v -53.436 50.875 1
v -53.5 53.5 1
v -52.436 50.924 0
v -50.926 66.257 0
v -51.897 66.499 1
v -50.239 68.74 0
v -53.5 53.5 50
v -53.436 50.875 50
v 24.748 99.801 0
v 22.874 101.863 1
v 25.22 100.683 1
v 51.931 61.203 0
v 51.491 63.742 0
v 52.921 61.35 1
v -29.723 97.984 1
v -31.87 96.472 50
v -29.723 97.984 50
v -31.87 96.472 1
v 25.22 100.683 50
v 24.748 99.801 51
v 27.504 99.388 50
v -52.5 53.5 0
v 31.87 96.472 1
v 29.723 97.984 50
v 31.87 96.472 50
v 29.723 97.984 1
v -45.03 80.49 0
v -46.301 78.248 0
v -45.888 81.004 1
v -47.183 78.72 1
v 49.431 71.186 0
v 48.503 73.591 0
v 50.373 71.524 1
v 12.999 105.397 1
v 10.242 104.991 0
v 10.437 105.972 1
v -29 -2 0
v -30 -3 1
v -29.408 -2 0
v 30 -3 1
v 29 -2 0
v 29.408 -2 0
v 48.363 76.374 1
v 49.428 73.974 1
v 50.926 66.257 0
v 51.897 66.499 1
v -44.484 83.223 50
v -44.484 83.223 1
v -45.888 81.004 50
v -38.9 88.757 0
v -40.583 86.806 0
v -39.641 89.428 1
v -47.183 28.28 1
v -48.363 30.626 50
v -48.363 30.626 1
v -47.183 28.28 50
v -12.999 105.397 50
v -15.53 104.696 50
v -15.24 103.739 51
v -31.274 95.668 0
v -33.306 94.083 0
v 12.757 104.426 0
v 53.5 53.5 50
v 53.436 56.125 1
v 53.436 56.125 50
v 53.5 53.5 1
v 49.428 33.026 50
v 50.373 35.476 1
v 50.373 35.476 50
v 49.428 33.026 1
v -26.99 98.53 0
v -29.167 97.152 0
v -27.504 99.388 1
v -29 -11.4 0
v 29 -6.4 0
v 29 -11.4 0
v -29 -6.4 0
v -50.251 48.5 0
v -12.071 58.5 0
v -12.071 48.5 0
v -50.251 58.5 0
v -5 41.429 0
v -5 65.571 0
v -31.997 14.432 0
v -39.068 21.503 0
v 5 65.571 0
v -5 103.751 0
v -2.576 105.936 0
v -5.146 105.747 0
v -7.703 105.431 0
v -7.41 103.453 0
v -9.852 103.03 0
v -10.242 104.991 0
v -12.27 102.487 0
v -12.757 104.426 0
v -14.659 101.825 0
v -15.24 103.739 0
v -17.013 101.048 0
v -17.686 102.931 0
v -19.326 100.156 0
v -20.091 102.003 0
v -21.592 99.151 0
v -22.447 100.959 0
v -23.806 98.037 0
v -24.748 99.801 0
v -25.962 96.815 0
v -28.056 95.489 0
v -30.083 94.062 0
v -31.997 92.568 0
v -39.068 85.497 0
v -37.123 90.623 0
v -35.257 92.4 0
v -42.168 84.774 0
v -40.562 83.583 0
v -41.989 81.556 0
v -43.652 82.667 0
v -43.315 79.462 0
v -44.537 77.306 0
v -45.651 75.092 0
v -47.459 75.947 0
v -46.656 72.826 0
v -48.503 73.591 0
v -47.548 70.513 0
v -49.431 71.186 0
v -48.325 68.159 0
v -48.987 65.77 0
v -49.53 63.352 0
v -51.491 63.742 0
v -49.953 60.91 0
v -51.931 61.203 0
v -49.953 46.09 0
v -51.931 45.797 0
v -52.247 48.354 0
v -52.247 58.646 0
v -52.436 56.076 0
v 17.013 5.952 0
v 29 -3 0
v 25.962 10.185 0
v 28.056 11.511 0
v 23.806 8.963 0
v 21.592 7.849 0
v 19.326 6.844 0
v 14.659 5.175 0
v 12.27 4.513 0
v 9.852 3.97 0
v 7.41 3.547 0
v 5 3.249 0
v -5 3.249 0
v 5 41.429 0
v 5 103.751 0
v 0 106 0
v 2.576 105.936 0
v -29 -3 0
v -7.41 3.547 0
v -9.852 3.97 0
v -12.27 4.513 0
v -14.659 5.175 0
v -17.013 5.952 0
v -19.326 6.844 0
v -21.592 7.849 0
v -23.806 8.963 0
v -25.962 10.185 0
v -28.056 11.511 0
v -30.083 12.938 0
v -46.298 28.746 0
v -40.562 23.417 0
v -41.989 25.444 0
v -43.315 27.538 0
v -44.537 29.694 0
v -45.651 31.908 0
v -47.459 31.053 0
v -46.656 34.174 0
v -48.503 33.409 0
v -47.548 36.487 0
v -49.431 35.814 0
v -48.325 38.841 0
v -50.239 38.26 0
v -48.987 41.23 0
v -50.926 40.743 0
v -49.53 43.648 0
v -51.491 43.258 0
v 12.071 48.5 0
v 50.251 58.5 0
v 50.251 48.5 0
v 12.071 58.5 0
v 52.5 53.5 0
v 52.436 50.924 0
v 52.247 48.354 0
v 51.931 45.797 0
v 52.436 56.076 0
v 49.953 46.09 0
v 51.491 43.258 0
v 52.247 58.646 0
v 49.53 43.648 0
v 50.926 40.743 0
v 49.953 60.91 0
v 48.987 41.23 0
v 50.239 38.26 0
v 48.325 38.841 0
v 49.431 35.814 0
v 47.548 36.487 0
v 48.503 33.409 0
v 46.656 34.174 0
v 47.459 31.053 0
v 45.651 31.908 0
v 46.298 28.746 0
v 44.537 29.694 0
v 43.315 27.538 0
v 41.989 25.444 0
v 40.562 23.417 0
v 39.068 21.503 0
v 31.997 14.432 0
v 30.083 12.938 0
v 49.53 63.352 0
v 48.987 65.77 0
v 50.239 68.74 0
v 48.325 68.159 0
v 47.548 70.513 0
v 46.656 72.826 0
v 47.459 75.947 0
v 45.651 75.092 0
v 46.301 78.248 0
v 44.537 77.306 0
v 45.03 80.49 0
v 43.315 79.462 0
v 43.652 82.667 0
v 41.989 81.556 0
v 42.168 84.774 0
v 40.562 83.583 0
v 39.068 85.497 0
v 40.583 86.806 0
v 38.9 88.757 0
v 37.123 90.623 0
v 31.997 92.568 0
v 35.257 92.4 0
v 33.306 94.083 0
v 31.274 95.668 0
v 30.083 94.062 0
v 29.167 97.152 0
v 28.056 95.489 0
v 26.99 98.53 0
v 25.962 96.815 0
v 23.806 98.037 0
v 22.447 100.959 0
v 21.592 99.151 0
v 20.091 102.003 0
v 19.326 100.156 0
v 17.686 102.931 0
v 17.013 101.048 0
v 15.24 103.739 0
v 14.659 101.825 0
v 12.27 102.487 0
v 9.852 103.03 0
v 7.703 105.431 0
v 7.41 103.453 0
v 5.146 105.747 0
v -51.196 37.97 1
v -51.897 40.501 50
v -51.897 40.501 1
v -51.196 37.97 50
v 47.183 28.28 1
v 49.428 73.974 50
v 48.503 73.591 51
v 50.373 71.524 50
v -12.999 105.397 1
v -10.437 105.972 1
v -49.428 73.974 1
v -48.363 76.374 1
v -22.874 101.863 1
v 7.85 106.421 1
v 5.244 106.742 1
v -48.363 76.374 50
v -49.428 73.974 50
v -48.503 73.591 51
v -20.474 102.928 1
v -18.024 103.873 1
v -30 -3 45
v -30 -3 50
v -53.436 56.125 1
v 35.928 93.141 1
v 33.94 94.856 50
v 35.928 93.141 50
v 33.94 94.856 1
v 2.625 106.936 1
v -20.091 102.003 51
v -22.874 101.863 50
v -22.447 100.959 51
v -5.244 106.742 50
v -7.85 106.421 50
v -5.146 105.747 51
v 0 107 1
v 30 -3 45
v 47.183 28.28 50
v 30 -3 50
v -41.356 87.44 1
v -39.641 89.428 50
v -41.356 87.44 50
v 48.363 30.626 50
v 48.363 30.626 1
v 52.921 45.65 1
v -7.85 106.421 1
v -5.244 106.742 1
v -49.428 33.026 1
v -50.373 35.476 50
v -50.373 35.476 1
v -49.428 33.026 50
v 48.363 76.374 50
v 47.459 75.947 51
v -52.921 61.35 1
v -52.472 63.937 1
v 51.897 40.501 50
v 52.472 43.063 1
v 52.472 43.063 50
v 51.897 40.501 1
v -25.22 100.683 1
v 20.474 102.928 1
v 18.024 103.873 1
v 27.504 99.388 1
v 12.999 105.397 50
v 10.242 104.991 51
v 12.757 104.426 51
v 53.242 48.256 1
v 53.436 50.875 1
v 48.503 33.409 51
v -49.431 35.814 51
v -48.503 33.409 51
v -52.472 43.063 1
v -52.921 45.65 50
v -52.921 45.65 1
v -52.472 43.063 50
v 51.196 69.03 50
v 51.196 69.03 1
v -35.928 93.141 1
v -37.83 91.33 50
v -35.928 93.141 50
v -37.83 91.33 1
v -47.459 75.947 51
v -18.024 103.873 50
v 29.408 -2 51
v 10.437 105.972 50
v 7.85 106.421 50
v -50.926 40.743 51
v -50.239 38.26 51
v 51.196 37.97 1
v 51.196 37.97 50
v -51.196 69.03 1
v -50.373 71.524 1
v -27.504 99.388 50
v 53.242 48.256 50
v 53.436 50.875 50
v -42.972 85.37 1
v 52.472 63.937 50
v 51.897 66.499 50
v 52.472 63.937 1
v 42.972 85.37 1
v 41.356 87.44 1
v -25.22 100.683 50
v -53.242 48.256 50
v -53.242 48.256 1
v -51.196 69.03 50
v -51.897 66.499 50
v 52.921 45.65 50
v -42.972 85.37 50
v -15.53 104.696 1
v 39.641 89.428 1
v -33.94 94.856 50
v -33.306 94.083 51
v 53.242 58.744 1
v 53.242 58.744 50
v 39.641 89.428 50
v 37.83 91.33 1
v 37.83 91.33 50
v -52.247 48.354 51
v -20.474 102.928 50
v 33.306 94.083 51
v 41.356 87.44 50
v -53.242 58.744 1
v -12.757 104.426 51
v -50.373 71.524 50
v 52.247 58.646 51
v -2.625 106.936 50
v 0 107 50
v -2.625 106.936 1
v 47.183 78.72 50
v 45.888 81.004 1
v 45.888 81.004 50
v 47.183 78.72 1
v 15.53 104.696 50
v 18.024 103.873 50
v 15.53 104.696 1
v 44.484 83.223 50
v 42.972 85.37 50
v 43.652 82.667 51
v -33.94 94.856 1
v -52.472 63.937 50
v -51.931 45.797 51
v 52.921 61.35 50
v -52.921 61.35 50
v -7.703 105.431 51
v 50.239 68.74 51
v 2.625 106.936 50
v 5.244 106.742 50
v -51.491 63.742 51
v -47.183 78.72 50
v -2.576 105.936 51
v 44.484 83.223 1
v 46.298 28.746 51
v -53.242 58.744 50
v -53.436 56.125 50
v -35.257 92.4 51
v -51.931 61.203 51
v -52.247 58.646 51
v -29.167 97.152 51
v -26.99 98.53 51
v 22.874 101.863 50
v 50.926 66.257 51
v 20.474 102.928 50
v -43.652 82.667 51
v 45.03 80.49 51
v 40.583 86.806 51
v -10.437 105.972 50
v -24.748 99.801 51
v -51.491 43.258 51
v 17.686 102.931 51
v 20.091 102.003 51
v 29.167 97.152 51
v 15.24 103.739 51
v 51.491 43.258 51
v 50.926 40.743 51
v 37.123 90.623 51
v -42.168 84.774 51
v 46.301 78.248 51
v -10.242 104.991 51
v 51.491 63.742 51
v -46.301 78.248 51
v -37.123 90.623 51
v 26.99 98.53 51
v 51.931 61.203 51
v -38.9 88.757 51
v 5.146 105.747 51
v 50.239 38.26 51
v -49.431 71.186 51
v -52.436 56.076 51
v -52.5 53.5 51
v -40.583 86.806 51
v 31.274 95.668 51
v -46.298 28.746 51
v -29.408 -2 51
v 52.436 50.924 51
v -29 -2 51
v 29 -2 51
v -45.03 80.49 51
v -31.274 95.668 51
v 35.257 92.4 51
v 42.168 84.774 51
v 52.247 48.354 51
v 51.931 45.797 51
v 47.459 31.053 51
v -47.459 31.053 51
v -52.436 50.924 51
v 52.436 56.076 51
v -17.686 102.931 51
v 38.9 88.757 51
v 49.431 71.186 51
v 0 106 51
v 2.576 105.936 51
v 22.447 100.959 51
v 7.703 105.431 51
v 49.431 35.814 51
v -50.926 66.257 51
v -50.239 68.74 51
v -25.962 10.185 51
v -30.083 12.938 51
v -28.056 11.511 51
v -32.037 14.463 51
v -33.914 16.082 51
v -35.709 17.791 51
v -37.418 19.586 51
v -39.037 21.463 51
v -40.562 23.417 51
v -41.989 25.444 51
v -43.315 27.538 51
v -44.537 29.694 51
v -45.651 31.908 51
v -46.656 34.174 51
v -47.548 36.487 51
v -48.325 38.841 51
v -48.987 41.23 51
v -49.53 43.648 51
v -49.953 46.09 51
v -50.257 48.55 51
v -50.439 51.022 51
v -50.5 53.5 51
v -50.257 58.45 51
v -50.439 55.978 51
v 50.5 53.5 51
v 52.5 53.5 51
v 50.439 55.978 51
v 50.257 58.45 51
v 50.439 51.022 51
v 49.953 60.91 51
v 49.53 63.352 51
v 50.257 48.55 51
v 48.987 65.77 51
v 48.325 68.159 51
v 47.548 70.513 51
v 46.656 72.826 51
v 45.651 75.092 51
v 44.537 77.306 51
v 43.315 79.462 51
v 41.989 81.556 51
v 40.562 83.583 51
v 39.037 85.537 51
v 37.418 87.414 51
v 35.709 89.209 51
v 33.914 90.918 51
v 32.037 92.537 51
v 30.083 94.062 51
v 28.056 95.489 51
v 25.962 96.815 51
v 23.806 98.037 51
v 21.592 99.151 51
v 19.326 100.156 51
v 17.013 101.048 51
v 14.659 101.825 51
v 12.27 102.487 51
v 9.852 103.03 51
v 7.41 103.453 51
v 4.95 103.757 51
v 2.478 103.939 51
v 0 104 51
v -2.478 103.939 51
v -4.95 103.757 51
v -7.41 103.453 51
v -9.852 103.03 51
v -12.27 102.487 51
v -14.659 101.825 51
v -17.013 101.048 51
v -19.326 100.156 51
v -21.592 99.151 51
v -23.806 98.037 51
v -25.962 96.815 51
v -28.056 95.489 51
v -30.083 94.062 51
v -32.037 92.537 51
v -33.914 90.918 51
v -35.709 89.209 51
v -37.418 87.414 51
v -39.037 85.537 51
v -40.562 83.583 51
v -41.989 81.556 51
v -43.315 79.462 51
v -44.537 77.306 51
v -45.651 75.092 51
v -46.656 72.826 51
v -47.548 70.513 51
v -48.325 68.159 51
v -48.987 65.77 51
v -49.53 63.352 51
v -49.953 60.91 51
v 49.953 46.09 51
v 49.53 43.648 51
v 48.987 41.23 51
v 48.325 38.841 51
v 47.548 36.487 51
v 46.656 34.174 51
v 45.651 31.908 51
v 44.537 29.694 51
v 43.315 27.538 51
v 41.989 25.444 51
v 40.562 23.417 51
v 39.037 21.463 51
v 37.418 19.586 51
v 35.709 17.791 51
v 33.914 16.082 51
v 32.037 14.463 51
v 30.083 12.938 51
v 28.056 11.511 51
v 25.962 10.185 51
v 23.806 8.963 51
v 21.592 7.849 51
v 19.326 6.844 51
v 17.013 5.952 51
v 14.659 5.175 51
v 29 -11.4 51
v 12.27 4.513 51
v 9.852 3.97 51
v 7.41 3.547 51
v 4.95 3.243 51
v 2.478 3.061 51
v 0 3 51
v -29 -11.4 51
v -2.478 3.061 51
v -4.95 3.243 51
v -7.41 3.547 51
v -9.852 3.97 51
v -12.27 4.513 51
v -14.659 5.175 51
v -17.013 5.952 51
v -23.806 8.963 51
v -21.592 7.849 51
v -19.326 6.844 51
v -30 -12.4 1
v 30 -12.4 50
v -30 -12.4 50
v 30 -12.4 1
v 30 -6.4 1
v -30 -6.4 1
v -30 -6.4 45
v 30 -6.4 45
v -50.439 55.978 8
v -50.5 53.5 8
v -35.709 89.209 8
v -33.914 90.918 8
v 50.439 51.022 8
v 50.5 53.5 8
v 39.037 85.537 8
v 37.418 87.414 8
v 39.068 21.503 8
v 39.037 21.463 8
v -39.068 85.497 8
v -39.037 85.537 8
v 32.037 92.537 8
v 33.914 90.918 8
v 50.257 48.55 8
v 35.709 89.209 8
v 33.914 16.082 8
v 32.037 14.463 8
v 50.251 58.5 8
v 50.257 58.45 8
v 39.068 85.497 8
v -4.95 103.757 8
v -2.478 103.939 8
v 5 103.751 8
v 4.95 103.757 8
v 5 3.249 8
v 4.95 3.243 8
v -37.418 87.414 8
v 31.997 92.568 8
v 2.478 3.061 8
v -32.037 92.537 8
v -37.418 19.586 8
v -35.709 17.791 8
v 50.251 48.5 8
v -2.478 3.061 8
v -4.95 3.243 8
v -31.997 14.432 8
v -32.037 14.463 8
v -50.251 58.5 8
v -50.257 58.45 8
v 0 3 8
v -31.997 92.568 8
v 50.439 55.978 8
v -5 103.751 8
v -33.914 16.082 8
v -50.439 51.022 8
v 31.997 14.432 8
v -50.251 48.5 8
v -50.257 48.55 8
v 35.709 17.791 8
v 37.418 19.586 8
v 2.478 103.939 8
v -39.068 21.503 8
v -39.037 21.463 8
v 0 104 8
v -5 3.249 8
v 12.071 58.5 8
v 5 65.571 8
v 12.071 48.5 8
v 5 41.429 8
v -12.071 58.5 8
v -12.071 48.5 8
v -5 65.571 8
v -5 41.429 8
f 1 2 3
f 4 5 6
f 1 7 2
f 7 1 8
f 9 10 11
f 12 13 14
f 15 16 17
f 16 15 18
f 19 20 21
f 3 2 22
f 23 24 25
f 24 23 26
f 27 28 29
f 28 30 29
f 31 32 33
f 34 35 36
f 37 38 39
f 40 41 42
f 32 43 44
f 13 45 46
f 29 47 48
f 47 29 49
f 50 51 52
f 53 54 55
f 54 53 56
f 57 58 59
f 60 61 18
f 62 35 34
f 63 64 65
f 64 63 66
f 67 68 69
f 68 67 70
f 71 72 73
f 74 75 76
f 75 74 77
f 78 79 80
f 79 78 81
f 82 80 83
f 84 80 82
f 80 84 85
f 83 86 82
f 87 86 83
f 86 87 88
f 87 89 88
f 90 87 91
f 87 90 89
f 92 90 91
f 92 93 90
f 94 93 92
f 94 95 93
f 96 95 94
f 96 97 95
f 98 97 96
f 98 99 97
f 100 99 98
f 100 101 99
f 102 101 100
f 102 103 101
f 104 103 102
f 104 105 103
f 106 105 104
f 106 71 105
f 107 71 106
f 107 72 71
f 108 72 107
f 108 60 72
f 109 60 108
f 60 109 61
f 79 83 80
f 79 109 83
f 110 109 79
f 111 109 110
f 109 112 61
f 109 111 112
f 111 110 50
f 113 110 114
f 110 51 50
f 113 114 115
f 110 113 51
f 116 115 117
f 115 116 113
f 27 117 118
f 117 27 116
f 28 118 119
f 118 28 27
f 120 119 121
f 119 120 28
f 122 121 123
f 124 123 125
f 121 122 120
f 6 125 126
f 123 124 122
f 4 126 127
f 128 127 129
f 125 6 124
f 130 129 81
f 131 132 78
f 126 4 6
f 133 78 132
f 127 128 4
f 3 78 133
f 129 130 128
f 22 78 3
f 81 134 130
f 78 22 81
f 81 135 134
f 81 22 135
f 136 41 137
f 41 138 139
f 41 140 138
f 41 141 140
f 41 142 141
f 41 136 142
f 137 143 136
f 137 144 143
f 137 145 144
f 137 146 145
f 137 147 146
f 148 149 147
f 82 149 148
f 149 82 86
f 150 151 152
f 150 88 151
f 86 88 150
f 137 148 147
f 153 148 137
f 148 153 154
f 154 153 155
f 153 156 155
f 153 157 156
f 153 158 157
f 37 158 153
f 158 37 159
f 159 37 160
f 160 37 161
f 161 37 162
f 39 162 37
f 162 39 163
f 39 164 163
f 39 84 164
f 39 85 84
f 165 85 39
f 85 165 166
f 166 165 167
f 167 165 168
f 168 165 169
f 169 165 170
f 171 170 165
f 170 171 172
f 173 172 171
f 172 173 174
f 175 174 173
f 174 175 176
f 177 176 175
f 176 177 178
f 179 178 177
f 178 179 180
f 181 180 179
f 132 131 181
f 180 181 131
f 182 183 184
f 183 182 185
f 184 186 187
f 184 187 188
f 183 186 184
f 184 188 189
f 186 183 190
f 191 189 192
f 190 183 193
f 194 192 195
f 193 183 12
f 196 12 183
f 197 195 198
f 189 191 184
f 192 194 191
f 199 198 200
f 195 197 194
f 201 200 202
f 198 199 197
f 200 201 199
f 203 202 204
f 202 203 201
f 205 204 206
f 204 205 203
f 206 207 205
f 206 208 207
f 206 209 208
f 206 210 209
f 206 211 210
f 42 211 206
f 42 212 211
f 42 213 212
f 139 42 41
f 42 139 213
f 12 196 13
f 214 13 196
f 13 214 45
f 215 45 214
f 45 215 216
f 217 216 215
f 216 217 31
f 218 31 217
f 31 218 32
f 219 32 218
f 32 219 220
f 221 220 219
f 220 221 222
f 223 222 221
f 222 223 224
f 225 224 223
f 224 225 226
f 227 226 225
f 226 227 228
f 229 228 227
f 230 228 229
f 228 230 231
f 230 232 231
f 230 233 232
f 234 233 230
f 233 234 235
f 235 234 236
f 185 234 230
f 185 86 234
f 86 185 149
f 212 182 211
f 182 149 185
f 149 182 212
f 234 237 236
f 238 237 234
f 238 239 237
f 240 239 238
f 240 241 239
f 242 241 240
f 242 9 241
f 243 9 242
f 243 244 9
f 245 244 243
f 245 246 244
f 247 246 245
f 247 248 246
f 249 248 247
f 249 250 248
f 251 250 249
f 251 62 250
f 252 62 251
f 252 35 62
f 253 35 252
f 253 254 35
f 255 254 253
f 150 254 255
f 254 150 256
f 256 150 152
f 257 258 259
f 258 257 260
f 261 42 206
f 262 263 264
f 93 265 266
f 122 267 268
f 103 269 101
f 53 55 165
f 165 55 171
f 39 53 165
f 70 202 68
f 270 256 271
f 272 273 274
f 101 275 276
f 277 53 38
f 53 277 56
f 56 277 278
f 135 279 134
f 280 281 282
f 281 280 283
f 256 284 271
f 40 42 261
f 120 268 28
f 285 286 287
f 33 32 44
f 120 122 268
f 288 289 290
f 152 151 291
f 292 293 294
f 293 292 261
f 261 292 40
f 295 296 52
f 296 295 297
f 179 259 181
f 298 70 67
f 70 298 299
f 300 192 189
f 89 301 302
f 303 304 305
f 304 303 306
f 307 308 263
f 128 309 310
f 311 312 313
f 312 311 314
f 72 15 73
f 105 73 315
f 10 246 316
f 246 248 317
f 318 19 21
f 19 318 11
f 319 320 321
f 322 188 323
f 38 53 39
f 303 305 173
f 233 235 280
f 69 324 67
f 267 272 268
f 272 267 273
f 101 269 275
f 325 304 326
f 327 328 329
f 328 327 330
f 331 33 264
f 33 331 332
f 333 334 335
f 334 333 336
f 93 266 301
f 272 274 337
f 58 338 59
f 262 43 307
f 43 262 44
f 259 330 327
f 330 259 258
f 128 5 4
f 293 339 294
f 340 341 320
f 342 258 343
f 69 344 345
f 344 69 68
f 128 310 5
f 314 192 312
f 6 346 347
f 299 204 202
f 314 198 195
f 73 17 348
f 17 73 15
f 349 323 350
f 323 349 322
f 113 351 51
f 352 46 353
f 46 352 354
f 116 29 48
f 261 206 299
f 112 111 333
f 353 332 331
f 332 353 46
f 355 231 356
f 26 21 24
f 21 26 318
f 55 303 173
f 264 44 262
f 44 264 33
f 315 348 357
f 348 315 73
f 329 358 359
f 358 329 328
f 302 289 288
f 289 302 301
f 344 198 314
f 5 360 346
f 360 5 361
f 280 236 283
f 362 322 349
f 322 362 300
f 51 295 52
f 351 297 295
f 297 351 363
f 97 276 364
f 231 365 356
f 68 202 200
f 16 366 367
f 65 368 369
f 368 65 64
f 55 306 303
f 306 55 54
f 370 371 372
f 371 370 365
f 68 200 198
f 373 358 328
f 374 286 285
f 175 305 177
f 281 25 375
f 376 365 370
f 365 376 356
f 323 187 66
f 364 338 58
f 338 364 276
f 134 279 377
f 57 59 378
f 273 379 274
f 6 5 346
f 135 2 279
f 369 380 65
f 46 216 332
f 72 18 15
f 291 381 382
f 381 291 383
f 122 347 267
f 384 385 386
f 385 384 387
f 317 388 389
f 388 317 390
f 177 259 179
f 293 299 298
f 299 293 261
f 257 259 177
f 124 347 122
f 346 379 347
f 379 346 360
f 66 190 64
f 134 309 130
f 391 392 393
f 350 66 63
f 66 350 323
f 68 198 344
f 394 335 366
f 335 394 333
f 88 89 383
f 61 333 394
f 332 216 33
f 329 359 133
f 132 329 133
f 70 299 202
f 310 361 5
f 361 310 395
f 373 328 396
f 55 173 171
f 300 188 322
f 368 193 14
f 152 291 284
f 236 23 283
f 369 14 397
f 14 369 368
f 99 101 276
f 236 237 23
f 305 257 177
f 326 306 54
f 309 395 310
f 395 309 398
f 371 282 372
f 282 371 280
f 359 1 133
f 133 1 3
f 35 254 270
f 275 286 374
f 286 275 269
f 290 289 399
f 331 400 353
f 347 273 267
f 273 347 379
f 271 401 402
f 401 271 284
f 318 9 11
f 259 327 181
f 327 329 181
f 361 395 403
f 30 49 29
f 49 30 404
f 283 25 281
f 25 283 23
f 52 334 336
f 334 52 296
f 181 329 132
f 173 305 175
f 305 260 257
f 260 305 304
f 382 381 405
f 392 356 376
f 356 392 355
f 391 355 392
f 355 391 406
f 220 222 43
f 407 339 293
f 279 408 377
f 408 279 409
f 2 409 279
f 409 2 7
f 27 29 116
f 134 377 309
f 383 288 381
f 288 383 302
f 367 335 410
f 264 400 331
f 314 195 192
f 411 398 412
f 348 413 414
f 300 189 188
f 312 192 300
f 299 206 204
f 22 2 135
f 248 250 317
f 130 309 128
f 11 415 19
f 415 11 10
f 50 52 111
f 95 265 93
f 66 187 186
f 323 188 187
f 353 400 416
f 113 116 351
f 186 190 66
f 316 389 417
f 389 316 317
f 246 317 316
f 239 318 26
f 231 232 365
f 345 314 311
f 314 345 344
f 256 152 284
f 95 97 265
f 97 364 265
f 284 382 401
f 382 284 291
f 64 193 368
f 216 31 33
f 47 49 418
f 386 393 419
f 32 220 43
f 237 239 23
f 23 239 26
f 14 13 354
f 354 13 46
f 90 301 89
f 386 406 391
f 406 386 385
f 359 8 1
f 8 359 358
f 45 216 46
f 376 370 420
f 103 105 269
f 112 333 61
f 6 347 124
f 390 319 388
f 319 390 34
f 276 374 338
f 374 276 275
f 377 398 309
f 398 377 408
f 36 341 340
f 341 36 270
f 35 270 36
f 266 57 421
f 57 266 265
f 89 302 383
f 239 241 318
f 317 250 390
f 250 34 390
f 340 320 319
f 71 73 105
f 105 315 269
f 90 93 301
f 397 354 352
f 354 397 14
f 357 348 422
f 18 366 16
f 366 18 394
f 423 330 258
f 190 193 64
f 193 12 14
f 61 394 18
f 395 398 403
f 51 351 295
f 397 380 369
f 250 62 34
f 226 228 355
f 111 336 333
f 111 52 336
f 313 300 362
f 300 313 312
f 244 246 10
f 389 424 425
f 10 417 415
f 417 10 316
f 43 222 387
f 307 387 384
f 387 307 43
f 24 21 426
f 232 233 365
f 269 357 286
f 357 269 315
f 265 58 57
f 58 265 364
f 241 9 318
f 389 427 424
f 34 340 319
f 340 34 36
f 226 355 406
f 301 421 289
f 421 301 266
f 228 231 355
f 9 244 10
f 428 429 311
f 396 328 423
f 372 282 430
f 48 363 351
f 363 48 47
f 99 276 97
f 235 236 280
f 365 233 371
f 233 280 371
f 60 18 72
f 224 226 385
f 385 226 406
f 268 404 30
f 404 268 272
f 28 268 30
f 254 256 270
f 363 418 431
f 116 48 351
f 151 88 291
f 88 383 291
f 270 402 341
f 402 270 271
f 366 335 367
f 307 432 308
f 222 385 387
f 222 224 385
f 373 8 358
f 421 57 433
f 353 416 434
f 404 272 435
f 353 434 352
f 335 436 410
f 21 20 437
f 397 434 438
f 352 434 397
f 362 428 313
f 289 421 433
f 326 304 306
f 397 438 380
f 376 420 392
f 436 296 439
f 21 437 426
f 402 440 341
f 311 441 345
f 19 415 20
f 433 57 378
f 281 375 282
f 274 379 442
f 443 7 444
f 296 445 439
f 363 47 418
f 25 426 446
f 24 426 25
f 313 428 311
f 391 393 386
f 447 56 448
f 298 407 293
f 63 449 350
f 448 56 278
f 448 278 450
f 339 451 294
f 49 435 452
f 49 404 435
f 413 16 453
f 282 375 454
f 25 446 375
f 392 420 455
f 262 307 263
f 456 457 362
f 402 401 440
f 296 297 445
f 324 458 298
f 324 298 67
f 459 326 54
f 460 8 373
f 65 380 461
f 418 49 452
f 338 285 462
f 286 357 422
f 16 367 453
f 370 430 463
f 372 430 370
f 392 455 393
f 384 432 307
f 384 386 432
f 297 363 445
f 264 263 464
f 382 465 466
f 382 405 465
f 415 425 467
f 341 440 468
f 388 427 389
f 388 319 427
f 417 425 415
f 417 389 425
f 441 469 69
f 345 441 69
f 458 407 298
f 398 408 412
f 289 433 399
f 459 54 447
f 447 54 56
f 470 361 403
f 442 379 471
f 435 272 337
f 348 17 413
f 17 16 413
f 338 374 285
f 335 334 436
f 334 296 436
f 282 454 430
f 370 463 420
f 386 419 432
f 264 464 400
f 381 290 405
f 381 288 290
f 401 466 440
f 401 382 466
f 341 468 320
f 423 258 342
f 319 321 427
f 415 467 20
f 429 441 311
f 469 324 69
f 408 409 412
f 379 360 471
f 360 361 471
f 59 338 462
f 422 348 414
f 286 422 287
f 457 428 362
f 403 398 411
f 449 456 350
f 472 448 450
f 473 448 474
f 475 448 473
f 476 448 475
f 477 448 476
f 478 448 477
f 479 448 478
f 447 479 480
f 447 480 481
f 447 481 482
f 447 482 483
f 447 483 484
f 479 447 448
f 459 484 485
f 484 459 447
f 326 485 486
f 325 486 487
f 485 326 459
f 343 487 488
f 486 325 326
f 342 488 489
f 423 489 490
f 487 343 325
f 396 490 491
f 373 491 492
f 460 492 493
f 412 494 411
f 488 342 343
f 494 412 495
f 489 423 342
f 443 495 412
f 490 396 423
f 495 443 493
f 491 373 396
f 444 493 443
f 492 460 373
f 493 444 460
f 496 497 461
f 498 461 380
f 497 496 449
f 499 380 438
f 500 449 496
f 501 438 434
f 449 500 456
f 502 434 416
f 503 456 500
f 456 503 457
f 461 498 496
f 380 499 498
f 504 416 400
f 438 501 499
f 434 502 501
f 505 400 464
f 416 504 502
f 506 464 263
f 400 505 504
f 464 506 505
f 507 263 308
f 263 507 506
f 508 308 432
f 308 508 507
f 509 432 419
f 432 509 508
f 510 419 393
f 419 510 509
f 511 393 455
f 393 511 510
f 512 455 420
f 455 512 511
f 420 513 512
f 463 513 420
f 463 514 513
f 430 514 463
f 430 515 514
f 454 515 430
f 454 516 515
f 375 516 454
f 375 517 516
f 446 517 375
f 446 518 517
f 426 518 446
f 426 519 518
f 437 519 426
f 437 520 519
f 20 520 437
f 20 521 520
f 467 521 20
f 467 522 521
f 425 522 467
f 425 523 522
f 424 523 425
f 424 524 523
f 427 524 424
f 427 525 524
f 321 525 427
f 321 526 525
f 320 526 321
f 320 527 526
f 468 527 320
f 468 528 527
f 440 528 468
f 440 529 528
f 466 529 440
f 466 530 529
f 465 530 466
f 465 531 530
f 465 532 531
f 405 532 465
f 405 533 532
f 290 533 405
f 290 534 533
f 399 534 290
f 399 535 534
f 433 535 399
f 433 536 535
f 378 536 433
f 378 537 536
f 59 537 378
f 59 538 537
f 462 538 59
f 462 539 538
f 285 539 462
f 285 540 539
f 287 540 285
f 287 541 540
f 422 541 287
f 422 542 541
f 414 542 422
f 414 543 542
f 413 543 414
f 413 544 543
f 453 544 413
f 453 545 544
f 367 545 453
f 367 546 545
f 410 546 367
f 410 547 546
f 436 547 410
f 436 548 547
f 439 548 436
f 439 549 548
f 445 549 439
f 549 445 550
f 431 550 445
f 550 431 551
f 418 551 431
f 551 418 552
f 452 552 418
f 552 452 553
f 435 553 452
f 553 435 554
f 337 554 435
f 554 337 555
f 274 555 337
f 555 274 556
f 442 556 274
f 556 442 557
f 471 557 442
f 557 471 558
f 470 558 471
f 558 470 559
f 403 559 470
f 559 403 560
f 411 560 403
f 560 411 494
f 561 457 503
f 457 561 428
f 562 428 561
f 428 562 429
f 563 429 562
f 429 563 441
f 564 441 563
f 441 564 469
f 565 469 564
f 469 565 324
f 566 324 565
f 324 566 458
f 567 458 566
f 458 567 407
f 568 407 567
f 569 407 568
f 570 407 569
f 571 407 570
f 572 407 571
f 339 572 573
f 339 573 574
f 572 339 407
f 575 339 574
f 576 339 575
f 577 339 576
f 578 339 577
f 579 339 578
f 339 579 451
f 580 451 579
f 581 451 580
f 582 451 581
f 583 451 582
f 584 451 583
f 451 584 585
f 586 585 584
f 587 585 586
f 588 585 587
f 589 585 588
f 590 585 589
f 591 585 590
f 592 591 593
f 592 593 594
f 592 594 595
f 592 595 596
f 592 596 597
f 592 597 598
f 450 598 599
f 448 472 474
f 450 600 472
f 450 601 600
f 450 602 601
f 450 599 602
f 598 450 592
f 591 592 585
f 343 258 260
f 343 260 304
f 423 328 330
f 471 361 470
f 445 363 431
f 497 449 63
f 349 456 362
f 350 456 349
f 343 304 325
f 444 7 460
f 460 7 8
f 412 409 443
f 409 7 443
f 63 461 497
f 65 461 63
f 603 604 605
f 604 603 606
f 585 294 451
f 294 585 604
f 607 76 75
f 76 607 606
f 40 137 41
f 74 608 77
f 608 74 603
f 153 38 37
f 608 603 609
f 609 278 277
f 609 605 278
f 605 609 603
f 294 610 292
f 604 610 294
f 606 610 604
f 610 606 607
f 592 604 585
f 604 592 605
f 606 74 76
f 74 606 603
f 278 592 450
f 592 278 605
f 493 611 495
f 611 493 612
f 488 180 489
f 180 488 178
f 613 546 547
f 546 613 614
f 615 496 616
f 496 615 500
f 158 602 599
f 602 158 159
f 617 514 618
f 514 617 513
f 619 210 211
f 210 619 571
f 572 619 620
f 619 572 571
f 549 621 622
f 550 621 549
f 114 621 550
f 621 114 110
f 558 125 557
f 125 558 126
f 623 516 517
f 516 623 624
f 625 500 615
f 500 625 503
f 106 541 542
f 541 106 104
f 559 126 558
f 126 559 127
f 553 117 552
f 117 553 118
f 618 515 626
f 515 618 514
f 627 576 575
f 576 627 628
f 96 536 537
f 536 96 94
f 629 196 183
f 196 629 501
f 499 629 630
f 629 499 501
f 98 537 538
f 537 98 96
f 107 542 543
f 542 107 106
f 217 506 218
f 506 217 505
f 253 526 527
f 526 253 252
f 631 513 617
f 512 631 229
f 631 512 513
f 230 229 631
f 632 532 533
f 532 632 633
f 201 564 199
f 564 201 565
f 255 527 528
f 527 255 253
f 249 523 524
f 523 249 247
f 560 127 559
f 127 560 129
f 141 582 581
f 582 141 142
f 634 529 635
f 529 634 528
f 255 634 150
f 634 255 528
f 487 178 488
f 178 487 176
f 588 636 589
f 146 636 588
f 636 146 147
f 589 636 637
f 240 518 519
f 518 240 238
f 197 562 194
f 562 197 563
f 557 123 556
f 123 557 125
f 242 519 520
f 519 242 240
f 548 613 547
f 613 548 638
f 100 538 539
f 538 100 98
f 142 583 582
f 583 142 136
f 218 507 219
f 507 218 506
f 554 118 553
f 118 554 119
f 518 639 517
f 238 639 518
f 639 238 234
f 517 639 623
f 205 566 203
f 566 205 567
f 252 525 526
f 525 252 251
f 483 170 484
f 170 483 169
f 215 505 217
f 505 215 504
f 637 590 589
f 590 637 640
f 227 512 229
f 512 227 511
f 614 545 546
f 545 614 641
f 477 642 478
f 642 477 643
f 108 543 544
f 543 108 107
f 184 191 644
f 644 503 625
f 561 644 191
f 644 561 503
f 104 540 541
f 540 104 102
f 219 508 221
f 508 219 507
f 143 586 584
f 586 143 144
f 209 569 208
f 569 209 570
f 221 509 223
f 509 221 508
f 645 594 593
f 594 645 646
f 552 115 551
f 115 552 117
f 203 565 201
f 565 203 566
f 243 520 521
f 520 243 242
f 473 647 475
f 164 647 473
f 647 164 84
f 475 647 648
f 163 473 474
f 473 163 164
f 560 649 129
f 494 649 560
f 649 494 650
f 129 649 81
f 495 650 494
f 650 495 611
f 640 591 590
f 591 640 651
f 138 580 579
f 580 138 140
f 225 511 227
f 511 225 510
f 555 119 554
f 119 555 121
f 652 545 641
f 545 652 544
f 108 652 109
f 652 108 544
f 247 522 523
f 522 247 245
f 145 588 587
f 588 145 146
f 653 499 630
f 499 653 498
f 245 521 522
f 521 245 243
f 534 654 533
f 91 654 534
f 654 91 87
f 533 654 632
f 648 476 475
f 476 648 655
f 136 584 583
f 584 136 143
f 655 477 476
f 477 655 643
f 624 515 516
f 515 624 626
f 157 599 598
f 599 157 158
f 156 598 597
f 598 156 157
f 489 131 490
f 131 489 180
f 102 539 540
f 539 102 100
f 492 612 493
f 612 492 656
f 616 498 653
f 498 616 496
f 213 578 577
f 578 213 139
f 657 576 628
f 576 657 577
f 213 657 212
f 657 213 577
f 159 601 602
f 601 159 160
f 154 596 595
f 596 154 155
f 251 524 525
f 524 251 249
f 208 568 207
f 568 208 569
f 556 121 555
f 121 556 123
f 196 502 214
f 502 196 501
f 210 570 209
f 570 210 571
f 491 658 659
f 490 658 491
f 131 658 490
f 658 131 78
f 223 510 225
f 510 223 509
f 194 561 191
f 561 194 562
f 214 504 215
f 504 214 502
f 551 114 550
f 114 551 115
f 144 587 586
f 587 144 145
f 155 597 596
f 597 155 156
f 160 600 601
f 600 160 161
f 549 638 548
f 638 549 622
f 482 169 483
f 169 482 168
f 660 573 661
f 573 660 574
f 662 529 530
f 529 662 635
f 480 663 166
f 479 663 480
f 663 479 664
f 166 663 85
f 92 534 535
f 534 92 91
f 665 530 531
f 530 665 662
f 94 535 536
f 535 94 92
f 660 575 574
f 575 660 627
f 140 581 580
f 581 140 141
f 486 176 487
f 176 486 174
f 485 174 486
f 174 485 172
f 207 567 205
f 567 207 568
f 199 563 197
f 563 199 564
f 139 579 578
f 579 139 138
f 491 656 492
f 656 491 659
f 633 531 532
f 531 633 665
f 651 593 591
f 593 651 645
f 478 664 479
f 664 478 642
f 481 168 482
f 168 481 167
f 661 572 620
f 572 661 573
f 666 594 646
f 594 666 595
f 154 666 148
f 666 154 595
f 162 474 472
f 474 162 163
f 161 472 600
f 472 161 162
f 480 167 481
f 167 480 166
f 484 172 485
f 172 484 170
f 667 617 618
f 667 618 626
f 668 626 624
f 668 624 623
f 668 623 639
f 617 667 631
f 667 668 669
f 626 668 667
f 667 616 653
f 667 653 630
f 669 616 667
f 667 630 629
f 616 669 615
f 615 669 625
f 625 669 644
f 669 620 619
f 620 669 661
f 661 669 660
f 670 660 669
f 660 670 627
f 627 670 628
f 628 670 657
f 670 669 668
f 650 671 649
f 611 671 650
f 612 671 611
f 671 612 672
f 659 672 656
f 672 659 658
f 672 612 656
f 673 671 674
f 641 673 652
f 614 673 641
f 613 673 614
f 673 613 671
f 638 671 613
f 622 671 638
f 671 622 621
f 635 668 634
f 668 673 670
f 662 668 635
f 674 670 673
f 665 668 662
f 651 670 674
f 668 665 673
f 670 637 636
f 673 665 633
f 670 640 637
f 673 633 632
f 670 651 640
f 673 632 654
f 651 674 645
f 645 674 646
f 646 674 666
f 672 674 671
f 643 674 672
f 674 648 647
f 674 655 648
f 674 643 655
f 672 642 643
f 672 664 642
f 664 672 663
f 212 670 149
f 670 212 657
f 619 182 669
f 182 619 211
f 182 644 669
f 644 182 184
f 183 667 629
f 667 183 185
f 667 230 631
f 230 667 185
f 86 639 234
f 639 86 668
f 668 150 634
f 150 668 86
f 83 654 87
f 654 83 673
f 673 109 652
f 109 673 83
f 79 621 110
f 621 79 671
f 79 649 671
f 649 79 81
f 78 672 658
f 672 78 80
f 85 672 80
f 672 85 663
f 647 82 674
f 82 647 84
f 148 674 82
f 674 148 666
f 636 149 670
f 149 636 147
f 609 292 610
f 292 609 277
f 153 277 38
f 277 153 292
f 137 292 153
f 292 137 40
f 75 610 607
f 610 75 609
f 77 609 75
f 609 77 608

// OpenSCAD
$fn = 128;

// Pod envelope; clearance is per side. Radius 50 gives a circular 100 mm pod.
pod_width = 100;
pod_depth = 100;
pod_corner_radius = 50;
pod_clearance = 0.5;
floor_thickness = 8;
wall_thickness = 3;
rib_width = 10;
edge_chamfer = 1;

// X: along the shelf edge; Y: toward the pod; Z: upward in use.
shelf_thickness = 3;
slot_clearance = 0.4; // Total allowance, not per side.
slot_length = 60;
slot_depth = 45;
hook_thickness = 6;
// Wall height above the floor; the default is flush with the hook top.
retaining_height = slot_depth + hook_thickness - floor_thickness;

inner_width = pod_width + 2 * pod_clearance;
inner_depth = pod_depth + 2 * pod_clearance;
slot_gap = shelf_thickness + slot_clearance;
hook_height = slot_depth + hook_thickness;
tray_height = floor_thickness + retaining_height;
front_y = wall_thickness - hook_thickness;
back_y = front_y - slot_gap - hook_thickness;
eps = 0.01;

assert(pod_width > 0 && pod_depth > 0 && pod_clearance >= 0);
assert(pod_corner_radius >= 0 && 2 * pod_corner_radius <= min(pod_width, pod_depth));
assert(slot_length > 0 && slot_length <= 60, "slot_length must be <= 60 mm");
assert(slot_depth > 0 && slot_depth <= 45, "slot_depth must be <= 45 mm");
assert(shelf_thickness > 0 && slot_clearance >= 0);
assert(wall_thickness > 0 && hook_thickness > wall_thickness);
assert(floor_thickness > 0 && retaining_height > 0);
assert(rib_width > 0 && rib_width < min(inner_width, inner_depth));
assert(edge_chamfer > 0 && 2 * edge_chamfer < min(floor_thickness, wall_thickness, hook_thickness, slot_length));

module pod_profile(extra = 0) {
  radius = pod_corner_radius + pod_clearance + extra;
  translate([0, wall_thickness + inner_depth / 2])
    if (radius == 0) {
      square([pod_width, pod_depth], center = true);
    } else {
      hull()
        for (x = [-1, 1], y = [-1, 1])
          translate([x * (pod_width / 2 - pod_corner_radius), y * (pod_depth / 2 - pod_corner_radius)])
            circle(r = radius);
    }
}

// Convex outlines: a 1:1 inset at the top/bottom gives a 45 degree chamfer.
module chamfered_extrude(height) {
  hull() {
    translate([0, 0, edge_chamfer])
      linear_extrude(height - 2 * edge_chamfer) children();
    linear_extrude(height) offset(delta = -edge_chamfer) children();
  }
}

difference() {
  union() {
    // Fill the full hook width into the tray before cutting the pod cavity.
    chamfered_extrude(tray_height)
      hull() {
        pod_profile(wall_thickness);
        translate([-slot_length / 2, front_y])
          square([slot_length, hook_thickness]);
      }
    chamfered_extrude(hook_height)
      translate([-slot_length / 2, back_y])
        square([slot_length, 2 * hook_thickness + slot_gap]);
  }
  // Keep the slot faces straight; only the exterior outline is chamfered.
  translate([-slot_length / 2 - eps, front_y - slot_gap, -eps])
    cube([slot_length + 2 * eps, slot_gap, slot_depth + eps]);
  difference() {
    translate([0, 0, -eps])
      linear_extrude(max(tray_height, hook_height) + 2 * eps) pod_profile();
    translate([0, 0, -2 * eps])
      linear_extrude(floor_thickness + 2 * eps)
        translate([0, wall_thickness + inner_depth / 2])
          for (angle = [0:45:135])
            rotate(angle)
              square([2 * max(inner_width, inner_depth), rib_width], center = true);
  }
}
